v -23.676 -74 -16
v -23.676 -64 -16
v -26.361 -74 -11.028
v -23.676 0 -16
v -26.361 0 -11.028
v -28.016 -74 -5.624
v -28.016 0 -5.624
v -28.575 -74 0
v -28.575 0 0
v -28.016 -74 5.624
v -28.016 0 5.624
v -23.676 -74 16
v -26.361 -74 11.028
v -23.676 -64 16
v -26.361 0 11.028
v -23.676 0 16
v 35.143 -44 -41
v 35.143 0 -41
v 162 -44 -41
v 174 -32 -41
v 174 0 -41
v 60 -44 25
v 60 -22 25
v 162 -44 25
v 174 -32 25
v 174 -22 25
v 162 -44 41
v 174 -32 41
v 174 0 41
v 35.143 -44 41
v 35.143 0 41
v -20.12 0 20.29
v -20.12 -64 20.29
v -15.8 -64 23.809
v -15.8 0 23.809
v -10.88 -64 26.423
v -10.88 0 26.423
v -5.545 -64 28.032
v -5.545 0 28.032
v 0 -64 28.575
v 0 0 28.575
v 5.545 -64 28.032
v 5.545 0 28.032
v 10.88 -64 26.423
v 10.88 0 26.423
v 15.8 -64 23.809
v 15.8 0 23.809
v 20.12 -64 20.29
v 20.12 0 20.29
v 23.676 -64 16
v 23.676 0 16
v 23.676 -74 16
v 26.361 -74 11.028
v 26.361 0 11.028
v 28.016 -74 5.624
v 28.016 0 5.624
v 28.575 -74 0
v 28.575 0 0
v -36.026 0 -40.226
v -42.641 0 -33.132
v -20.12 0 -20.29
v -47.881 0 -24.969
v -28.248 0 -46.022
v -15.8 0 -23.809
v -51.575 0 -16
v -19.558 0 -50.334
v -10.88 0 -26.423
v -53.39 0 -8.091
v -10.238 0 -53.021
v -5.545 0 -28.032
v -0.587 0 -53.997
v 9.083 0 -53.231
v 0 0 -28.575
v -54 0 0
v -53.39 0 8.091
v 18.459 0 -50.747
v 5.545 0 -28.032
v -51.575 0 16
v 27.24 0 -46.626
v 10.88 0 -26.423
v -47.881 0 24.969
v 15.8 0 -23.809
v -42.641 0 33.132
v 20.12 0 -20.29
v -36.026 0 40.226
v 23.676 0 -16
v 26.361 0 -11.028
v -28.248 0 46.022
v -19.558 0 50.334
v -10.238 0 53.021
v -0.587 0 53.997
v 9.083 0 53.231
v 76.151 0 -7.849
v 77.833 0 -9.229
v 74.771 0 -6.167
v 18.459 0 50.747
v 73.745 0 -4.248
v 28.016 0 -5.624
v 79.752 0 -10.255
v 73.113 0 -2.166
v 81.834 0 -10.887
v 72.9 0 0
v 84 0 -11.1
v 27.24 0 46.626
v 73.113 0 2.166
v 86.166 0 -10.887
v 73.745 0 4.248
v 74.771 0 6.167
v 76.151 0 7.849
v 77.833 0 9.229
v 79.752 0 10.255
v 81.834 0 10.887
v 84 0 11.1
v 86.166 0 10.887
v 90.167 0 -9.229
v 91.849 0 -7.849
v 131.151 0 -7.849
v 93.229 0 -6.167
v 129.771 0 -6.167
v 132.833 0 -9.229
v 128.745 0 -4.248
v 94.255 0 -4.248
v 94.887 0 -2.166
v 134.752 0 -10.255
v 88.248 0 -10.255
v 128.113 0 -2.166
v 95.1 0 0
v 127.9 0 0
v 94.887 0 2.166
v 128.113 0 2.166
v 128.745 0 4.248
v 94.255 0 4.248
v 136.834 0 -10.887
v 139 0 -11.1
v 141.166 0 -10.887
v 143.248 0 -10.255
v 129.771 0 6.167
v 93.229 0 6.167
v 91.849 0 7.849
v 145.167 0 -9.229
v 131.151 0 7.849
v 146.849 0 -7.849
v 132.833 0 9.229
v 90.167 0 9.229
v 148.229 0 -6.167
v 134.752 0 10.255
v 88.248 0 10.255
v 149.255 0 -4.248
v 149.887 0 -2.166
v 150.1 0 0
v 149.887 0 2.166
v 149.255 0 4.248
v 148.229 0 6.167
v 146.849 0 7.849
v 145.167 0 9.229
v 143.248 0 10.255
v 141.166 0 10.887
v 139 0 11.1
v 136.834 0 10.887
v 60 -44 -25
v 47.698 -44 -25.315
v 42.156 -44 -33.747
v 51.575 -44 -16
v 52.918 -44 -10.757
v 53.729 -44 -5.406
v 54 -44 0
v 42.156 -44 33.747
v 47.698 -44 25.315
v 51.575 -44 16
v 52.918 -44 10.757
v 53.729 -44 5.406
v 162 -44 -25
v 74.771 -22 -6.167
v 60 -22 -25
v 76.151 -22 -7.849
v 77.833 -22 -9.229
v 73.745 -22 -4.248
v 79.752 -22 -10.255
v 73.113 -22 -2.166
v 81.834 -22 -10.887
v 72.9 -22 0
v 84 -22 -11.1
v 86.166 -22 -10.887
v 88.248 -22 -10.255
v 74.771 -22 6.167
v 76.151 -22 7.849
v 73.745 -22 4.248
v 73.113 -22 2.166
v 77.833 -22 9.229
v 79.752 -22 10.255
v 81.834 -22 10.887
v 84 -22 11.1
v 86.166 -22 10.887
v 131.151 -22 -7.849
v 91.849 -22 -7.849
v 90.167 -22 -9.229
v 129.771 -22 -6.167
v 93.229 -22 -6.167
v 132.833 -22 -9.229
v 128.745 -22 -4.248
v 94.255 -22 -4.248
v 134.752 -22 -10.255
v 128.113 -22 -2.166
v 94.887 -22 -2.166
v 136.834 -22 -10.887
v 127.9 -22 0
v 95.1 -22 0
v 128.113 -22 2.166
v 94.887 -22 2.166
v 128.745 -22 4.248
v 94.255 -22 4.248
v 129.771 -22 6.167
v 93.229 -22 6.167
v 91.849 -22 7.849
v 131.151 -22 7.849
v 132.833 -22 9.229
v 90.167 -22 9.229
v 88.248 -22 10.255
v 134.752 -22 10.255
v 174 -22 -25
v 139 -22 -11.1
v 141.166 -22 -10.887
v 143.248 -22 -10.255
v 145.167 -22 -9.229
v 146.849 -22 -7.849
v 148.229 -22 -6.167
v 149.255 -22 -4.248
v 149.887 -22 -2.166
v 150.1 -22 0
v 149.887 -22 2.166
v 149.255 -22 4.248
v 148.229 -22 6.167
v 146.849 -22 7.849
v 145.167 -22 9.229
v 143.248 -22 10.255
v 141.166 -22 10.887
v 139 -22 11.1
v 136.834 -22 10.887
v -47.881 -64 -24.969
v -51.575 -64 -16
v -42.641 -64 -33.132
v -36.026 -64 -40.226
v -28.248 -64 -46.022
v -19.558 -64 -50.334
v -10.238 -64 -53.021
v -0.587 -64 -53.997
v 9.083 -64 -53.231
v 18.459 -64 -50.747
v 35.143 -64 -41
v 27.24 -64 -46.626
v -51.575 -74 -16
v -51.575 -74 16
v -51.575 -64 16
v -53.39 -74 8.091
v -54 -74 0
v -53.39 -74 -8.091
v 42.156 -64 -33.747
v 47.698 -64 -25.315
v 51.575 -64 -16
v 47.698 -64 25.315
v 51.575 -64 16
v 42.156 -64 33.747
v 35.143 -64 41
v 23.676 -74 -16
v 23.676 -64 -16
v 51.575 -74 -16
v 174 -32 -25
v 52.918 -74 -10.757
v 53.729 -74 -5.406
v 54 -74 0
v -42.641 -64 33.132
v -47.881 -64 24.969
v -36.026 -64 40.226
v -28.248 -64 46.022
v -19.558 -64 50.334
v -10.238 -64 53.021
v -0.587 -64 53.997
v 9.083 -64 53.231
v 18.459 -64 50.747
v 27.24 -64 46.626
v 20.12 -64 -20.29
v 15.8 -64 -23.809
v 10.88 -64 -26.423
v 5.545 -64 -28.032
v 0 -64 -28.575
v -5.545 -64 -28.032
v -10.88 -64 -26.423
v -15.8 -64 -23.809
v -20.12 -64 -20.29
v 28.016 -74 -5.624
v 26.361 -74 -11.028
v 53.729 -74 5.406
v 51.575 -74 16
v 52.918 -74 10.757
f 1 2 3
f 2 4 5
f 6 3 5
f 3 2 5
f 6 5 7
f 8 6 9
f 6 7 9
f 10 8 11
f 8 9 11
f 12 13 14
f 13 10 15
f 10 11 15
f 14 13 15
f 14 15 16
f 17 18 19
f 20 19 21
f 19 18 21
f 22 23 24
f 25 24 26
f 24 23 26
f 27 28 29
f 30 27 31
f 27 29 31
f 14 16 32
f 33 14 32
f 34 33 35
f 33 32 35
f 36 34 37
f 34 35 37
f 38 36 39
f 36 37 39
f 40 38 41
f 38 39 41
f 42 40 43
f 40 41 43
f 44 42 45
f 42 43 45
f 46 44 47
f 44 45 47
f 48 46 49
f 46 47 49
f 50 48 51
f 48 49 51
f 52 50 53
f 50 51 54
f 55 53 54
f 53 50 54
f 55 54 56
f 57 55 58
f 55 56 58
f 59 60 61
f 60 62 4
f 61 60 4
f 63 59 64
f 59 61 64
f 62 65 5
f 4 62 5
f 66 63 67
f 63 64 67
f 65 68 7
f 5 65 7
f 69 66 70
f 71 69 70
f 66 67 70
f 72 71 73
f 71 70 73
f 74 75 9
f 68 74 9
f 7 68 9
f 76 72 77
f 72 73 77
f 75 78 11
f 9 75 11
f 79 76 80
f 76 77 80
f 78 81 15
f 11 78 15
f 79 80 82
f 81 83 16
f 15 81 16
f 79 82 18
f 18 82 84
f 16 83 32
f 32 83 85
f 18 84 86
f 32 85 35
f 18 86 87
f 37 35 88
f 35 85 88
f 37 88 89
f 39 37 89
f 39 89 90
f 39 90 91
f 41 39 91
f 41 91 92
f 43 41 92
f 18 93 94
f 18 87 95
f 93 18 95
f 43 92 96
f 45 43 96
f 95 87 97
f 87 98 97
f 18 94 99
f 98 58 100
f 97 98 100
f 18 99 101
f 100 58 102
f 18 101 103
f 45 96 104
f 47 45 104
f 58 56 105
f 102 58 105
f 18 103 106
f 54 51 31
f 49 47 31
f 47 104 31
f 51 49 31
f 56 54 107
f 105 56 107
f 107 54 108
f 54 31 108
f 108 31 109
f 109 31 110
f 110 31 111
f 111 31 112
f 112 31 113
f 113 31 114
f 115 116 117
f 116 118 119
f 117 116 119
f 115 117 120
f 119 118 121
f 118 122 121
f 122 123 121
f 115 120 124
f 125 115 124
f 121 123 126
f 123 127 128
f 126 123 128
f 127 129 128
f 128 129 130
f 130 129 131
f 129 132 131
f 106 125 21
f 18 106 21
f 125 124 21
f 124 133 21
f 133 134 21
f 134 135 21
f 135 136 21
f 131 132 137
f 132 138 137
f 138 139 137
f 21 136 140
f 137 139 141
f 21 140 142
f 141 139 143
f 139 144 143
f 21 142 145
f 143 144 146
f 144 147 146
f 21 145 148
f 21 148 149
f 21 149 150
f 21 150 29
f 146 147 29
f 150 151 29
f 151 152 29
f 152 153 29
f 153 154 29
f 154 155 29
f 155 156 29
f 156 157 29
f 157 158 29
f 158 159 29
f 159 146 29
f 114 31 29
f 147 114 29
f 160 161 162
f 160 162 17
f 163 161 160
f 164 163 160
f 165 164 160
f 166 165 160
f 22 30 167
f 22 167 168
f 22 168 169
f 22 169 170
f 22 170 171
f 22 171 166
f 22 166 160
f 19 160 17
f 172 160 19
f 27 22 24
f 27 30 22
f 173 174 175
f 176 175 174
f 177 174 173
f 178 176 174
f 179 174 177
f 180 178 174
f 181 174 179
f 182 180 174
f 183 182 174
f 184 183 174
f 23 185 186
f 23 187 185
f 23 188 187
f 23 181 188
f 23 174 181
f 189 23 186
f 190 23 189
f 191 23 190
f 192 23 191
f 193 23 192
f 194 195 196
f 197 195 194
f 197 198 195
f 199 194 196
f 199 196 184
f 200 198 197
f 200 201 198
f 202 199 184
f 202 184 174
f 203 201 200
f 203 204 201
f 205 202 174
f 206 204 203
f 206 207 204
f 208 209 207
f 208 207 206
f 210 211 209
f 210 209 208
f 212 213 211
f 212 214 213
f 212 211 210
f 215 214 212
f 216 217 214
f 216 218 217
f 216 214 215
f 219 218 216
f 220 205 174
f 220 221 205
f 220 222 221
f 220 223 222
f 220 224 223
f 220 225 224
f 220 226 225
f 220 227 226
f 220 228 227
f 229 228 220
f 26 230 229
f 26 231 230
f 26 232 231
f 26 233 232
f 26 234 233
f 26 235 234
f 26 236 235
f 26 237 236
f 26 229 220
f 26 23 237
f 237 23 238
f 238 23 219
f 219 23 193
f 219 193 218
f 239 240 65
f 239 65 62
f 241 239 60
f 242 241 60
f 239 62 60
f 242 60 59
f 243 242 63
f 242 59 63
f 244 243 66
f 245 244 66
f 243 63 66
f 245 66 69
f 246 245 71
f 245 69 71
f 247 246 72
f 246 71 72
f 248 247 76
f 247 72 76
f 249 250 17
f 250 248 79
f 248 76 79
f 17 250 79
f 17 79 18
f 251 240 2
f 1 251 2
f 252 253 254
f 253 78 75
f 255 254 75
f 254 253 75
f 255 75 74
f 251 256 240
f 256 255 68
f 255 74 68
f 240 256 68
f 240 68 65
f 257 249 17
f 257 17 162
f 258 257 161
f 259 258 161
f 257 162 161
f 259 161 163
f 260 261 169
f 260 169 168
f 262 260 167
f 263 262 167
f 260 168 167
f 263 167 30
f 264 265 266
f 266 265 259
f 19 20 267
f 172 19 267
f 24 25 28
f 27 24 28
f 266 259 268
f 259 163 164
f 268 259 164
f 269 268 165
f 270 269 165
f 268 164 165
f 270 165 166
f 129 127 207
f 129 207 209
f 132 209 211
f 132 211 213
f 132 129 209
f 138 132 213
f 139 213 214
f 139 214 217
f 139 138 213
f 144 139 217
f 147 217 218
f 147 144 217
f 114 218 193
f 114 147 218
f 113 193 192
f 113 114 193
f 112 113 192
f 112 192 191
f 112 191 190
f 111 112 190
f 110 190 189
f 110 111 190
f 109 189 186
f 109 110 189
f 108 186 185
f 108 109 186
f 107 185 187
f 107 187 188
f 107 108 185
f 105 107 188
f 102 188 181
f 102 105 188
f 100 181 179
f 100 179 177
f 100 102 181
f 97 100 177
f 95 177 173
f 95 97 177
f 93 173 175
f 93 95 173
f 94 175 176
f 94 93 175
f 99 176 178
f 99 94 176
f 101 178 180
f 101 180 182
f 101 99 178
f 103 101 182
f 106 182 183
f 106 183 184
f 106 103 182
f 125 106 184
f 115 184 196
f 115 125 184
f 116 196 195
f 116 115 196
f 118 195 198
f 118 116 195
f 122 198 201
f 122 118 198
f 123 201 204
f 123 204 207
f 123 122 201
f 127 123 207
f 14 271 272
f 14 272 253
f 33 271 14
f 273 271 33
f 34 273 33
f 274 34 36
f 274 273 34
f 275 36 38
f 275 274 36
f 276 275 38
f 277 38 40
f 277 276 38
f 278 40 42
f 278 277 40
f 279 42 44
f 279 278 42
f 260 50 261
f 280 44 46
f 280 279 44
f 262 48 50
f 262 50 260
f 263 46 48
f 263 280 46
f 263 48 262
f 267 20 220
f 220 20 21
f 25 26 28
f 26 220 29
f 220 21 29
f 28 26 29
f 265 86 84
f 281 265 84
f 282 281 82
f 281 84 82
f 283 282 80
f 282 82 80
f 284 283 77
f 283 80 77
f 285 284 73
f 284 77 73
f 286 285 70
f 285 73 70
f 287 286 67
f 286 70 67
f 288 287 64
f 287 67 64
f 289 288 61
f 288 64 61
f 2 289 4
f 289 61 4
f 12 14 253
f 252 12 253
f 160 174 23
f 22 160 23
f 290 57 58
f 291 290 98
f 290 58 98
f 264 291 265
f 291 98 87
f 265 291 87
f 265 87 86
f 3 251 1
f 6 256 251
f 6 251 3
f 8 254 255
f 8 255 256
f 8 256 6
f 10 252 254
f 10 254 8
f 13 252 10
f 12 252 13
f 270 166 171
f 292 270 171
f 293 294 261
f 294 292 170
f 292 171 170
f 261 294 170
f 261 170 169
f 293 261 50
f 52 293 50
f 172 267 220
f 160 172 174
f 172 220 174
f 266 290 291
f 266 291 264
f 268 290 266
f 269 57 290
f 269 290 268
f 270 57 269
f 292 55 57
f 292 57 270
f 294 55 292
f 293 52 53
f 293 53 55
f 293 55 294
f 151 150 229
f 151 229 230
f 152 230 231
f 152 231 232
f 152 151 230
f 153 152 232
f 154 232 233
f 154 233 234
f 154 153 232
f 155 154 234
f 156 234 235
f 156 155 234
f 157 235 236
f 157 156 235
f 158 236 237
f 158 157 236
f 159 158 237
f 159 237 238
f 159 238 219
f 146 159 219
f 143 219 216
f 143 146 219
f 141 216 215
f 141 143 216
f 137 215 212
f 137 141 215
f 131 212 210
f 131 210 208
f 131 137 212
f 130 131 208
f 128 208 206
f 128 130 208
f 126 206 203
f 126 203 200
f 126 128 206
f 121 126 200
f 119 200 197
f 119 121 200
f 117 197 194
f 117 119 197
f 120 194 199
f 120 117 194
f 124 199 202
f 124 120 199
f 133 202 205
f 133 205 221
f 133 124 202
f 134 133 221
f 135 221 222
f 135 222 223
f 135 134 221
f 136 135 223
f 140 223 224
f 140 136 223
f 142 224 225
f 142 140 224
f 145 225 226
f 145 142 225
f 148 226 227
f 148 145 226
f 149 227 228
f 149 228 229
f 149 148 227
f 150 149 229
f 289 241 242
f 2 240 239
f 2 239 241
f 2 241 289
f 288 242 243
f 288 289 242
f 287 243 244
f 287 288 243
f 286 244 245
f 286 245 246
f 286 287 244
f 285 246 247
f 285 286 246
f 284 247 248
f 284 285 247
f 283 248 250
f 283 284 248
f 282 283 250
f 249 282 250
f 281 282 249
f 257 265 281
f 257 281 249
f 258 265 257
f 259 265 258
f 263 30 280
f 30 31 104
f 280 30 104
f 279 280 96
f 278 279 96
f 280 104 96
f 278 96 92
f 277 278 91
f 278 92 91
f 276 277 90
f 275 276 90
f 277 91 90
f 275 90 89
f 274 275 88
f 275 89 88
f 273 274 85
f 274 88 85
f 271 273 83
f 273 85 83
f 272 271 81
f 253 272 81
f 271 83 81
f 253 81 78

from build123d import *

# Parameters (mm, degrees)
F1_DEPTH = 44
F0_W     = 114
F0_H     = 50
F0_R     = 11.1
F2_DEPTH = 22
F3_DEPTH = 64
F4_DEPTH = 74
F5_SIZE2 = 12
F5_SIZE  = 12


with BuildPart() as f1:
    # F0 (on Front) → F1 (new body)
    with BuildSketch(Plane.XZ):
        with BuildLine():
            ThreePointArc((35.142567, 41), (45.124741, 29.660711), (51.575188, 16))
            ThreePointArc((51.575188, 16), (53.390356, 8.091349), (54, 0))
            ThreePointArc((54, 0), (53.390356, -8.091349), (51.575188, -16))
            ThreePointArc((51.575188, -16), (45.124741, -29.660711), (35.142567, -41))
            Line((35.142567, -41), (174, -41))
            Line((174, -41), (174, -25))
            Line((174, -25), (60, -25))
            Line((60, -25), (60, 25))
            Line((60, 25), (174, 25))
            Line((174, 25), (174, 41))
            Line((174, 41), (35.142567, 41))
        make_face()
    extrude(amount=F1_DEPTH)

    # F0 (on Front) → F2 (join)
    with BuildSketch(Plane.XZ):
        with Locations((117, 0)):
            Rectangle(F0_W, F0_H)
        with Locations((84, 0)):
            Circle(F0_R, mode=Mode.SUBTRACT)
        with Locations((139, 0)):
            Circle(F0_R, mode=Mode.SUBTRACT)
    extrude(amount=F2_DEPTH)

    # F0 (on Front) → F3 (join)
    with BuildSketch(Plane.XZ):
        with BuildLine():
            ThreePointArc((-23.675528, 16), (0, 28.575), (23.675528, 16))
            Line((23.675528, 16), (51.575188, 16))
            ThreePointArc((51.575188, 16), (45.124741, 29.660711), (35.142567, 41))
            ThreePointArc((35.142567, 41), (-14.958535, 51.886821), (-51.575188, 16))
            Line((-51.575188, 16), (-23.675528, 16))
        make_face()
        with BuildLine():
            Line((51.575188, -16), (23.675528, -16))
            ThreePointArc((23.675528, -16), (0, -28.575), (-23.675528, -16))
            Line((-23.675528, -16), (-51.575188, -16))
            ThreePointArc((-51.575188, -16), (-14.958535, -51.886821), (35.142567, -41))
            ThreePointArc((35.142567, -41), (45.124741, -29.660711), (51.575188, -16))
        make_face()
    extrude(amount=F3_DEPTH)

    # F0 (on Front) → F4 (join)
    with BuildSketch(Plane.XZ):
        with BuildLine():
            ThreePointArc((23.675528, 16), (27.322691, 8.366672), (28.575, 0))
            ThreePointArc((28.575, 0), (27.322691, -8.366672), (23.675528, -16))
            Line((23.675528, -16), (51.575188, -16))
            ThreePointArc((51.575188, -16), (53.390356, -8.091349), (54, 0))
            ThreePointArc((54, 0), (53.390356, 8.091349), (51.575188, 16))
            Line((51.575188, 16), (23.675528, 16))
        make_face()
        with BuildLine():
            ThreePointArc((-23.675528, -16), (-28.575, 0), (-23.675528, 16))
            Line((-23.675528, 16), (-51.575188, 16))
            ThreePointArc((-51.575188, 16), (-54, 0), (-51.575188, -16))
            Line((-51.575188, -16), (-23.675528, -16))
        make_face()
    extrude(amount=F4_DEPTH)

    # F5
    f5_edges = [f1.edges().sort_by_distance(p)[0] for p in [
        (174, -44, -33),
        (174, -44, 33),
    ]]
    chamfer(f5_edges, length=F5_SIZE, length2=F5_SIZE2)


solid = f1.part
